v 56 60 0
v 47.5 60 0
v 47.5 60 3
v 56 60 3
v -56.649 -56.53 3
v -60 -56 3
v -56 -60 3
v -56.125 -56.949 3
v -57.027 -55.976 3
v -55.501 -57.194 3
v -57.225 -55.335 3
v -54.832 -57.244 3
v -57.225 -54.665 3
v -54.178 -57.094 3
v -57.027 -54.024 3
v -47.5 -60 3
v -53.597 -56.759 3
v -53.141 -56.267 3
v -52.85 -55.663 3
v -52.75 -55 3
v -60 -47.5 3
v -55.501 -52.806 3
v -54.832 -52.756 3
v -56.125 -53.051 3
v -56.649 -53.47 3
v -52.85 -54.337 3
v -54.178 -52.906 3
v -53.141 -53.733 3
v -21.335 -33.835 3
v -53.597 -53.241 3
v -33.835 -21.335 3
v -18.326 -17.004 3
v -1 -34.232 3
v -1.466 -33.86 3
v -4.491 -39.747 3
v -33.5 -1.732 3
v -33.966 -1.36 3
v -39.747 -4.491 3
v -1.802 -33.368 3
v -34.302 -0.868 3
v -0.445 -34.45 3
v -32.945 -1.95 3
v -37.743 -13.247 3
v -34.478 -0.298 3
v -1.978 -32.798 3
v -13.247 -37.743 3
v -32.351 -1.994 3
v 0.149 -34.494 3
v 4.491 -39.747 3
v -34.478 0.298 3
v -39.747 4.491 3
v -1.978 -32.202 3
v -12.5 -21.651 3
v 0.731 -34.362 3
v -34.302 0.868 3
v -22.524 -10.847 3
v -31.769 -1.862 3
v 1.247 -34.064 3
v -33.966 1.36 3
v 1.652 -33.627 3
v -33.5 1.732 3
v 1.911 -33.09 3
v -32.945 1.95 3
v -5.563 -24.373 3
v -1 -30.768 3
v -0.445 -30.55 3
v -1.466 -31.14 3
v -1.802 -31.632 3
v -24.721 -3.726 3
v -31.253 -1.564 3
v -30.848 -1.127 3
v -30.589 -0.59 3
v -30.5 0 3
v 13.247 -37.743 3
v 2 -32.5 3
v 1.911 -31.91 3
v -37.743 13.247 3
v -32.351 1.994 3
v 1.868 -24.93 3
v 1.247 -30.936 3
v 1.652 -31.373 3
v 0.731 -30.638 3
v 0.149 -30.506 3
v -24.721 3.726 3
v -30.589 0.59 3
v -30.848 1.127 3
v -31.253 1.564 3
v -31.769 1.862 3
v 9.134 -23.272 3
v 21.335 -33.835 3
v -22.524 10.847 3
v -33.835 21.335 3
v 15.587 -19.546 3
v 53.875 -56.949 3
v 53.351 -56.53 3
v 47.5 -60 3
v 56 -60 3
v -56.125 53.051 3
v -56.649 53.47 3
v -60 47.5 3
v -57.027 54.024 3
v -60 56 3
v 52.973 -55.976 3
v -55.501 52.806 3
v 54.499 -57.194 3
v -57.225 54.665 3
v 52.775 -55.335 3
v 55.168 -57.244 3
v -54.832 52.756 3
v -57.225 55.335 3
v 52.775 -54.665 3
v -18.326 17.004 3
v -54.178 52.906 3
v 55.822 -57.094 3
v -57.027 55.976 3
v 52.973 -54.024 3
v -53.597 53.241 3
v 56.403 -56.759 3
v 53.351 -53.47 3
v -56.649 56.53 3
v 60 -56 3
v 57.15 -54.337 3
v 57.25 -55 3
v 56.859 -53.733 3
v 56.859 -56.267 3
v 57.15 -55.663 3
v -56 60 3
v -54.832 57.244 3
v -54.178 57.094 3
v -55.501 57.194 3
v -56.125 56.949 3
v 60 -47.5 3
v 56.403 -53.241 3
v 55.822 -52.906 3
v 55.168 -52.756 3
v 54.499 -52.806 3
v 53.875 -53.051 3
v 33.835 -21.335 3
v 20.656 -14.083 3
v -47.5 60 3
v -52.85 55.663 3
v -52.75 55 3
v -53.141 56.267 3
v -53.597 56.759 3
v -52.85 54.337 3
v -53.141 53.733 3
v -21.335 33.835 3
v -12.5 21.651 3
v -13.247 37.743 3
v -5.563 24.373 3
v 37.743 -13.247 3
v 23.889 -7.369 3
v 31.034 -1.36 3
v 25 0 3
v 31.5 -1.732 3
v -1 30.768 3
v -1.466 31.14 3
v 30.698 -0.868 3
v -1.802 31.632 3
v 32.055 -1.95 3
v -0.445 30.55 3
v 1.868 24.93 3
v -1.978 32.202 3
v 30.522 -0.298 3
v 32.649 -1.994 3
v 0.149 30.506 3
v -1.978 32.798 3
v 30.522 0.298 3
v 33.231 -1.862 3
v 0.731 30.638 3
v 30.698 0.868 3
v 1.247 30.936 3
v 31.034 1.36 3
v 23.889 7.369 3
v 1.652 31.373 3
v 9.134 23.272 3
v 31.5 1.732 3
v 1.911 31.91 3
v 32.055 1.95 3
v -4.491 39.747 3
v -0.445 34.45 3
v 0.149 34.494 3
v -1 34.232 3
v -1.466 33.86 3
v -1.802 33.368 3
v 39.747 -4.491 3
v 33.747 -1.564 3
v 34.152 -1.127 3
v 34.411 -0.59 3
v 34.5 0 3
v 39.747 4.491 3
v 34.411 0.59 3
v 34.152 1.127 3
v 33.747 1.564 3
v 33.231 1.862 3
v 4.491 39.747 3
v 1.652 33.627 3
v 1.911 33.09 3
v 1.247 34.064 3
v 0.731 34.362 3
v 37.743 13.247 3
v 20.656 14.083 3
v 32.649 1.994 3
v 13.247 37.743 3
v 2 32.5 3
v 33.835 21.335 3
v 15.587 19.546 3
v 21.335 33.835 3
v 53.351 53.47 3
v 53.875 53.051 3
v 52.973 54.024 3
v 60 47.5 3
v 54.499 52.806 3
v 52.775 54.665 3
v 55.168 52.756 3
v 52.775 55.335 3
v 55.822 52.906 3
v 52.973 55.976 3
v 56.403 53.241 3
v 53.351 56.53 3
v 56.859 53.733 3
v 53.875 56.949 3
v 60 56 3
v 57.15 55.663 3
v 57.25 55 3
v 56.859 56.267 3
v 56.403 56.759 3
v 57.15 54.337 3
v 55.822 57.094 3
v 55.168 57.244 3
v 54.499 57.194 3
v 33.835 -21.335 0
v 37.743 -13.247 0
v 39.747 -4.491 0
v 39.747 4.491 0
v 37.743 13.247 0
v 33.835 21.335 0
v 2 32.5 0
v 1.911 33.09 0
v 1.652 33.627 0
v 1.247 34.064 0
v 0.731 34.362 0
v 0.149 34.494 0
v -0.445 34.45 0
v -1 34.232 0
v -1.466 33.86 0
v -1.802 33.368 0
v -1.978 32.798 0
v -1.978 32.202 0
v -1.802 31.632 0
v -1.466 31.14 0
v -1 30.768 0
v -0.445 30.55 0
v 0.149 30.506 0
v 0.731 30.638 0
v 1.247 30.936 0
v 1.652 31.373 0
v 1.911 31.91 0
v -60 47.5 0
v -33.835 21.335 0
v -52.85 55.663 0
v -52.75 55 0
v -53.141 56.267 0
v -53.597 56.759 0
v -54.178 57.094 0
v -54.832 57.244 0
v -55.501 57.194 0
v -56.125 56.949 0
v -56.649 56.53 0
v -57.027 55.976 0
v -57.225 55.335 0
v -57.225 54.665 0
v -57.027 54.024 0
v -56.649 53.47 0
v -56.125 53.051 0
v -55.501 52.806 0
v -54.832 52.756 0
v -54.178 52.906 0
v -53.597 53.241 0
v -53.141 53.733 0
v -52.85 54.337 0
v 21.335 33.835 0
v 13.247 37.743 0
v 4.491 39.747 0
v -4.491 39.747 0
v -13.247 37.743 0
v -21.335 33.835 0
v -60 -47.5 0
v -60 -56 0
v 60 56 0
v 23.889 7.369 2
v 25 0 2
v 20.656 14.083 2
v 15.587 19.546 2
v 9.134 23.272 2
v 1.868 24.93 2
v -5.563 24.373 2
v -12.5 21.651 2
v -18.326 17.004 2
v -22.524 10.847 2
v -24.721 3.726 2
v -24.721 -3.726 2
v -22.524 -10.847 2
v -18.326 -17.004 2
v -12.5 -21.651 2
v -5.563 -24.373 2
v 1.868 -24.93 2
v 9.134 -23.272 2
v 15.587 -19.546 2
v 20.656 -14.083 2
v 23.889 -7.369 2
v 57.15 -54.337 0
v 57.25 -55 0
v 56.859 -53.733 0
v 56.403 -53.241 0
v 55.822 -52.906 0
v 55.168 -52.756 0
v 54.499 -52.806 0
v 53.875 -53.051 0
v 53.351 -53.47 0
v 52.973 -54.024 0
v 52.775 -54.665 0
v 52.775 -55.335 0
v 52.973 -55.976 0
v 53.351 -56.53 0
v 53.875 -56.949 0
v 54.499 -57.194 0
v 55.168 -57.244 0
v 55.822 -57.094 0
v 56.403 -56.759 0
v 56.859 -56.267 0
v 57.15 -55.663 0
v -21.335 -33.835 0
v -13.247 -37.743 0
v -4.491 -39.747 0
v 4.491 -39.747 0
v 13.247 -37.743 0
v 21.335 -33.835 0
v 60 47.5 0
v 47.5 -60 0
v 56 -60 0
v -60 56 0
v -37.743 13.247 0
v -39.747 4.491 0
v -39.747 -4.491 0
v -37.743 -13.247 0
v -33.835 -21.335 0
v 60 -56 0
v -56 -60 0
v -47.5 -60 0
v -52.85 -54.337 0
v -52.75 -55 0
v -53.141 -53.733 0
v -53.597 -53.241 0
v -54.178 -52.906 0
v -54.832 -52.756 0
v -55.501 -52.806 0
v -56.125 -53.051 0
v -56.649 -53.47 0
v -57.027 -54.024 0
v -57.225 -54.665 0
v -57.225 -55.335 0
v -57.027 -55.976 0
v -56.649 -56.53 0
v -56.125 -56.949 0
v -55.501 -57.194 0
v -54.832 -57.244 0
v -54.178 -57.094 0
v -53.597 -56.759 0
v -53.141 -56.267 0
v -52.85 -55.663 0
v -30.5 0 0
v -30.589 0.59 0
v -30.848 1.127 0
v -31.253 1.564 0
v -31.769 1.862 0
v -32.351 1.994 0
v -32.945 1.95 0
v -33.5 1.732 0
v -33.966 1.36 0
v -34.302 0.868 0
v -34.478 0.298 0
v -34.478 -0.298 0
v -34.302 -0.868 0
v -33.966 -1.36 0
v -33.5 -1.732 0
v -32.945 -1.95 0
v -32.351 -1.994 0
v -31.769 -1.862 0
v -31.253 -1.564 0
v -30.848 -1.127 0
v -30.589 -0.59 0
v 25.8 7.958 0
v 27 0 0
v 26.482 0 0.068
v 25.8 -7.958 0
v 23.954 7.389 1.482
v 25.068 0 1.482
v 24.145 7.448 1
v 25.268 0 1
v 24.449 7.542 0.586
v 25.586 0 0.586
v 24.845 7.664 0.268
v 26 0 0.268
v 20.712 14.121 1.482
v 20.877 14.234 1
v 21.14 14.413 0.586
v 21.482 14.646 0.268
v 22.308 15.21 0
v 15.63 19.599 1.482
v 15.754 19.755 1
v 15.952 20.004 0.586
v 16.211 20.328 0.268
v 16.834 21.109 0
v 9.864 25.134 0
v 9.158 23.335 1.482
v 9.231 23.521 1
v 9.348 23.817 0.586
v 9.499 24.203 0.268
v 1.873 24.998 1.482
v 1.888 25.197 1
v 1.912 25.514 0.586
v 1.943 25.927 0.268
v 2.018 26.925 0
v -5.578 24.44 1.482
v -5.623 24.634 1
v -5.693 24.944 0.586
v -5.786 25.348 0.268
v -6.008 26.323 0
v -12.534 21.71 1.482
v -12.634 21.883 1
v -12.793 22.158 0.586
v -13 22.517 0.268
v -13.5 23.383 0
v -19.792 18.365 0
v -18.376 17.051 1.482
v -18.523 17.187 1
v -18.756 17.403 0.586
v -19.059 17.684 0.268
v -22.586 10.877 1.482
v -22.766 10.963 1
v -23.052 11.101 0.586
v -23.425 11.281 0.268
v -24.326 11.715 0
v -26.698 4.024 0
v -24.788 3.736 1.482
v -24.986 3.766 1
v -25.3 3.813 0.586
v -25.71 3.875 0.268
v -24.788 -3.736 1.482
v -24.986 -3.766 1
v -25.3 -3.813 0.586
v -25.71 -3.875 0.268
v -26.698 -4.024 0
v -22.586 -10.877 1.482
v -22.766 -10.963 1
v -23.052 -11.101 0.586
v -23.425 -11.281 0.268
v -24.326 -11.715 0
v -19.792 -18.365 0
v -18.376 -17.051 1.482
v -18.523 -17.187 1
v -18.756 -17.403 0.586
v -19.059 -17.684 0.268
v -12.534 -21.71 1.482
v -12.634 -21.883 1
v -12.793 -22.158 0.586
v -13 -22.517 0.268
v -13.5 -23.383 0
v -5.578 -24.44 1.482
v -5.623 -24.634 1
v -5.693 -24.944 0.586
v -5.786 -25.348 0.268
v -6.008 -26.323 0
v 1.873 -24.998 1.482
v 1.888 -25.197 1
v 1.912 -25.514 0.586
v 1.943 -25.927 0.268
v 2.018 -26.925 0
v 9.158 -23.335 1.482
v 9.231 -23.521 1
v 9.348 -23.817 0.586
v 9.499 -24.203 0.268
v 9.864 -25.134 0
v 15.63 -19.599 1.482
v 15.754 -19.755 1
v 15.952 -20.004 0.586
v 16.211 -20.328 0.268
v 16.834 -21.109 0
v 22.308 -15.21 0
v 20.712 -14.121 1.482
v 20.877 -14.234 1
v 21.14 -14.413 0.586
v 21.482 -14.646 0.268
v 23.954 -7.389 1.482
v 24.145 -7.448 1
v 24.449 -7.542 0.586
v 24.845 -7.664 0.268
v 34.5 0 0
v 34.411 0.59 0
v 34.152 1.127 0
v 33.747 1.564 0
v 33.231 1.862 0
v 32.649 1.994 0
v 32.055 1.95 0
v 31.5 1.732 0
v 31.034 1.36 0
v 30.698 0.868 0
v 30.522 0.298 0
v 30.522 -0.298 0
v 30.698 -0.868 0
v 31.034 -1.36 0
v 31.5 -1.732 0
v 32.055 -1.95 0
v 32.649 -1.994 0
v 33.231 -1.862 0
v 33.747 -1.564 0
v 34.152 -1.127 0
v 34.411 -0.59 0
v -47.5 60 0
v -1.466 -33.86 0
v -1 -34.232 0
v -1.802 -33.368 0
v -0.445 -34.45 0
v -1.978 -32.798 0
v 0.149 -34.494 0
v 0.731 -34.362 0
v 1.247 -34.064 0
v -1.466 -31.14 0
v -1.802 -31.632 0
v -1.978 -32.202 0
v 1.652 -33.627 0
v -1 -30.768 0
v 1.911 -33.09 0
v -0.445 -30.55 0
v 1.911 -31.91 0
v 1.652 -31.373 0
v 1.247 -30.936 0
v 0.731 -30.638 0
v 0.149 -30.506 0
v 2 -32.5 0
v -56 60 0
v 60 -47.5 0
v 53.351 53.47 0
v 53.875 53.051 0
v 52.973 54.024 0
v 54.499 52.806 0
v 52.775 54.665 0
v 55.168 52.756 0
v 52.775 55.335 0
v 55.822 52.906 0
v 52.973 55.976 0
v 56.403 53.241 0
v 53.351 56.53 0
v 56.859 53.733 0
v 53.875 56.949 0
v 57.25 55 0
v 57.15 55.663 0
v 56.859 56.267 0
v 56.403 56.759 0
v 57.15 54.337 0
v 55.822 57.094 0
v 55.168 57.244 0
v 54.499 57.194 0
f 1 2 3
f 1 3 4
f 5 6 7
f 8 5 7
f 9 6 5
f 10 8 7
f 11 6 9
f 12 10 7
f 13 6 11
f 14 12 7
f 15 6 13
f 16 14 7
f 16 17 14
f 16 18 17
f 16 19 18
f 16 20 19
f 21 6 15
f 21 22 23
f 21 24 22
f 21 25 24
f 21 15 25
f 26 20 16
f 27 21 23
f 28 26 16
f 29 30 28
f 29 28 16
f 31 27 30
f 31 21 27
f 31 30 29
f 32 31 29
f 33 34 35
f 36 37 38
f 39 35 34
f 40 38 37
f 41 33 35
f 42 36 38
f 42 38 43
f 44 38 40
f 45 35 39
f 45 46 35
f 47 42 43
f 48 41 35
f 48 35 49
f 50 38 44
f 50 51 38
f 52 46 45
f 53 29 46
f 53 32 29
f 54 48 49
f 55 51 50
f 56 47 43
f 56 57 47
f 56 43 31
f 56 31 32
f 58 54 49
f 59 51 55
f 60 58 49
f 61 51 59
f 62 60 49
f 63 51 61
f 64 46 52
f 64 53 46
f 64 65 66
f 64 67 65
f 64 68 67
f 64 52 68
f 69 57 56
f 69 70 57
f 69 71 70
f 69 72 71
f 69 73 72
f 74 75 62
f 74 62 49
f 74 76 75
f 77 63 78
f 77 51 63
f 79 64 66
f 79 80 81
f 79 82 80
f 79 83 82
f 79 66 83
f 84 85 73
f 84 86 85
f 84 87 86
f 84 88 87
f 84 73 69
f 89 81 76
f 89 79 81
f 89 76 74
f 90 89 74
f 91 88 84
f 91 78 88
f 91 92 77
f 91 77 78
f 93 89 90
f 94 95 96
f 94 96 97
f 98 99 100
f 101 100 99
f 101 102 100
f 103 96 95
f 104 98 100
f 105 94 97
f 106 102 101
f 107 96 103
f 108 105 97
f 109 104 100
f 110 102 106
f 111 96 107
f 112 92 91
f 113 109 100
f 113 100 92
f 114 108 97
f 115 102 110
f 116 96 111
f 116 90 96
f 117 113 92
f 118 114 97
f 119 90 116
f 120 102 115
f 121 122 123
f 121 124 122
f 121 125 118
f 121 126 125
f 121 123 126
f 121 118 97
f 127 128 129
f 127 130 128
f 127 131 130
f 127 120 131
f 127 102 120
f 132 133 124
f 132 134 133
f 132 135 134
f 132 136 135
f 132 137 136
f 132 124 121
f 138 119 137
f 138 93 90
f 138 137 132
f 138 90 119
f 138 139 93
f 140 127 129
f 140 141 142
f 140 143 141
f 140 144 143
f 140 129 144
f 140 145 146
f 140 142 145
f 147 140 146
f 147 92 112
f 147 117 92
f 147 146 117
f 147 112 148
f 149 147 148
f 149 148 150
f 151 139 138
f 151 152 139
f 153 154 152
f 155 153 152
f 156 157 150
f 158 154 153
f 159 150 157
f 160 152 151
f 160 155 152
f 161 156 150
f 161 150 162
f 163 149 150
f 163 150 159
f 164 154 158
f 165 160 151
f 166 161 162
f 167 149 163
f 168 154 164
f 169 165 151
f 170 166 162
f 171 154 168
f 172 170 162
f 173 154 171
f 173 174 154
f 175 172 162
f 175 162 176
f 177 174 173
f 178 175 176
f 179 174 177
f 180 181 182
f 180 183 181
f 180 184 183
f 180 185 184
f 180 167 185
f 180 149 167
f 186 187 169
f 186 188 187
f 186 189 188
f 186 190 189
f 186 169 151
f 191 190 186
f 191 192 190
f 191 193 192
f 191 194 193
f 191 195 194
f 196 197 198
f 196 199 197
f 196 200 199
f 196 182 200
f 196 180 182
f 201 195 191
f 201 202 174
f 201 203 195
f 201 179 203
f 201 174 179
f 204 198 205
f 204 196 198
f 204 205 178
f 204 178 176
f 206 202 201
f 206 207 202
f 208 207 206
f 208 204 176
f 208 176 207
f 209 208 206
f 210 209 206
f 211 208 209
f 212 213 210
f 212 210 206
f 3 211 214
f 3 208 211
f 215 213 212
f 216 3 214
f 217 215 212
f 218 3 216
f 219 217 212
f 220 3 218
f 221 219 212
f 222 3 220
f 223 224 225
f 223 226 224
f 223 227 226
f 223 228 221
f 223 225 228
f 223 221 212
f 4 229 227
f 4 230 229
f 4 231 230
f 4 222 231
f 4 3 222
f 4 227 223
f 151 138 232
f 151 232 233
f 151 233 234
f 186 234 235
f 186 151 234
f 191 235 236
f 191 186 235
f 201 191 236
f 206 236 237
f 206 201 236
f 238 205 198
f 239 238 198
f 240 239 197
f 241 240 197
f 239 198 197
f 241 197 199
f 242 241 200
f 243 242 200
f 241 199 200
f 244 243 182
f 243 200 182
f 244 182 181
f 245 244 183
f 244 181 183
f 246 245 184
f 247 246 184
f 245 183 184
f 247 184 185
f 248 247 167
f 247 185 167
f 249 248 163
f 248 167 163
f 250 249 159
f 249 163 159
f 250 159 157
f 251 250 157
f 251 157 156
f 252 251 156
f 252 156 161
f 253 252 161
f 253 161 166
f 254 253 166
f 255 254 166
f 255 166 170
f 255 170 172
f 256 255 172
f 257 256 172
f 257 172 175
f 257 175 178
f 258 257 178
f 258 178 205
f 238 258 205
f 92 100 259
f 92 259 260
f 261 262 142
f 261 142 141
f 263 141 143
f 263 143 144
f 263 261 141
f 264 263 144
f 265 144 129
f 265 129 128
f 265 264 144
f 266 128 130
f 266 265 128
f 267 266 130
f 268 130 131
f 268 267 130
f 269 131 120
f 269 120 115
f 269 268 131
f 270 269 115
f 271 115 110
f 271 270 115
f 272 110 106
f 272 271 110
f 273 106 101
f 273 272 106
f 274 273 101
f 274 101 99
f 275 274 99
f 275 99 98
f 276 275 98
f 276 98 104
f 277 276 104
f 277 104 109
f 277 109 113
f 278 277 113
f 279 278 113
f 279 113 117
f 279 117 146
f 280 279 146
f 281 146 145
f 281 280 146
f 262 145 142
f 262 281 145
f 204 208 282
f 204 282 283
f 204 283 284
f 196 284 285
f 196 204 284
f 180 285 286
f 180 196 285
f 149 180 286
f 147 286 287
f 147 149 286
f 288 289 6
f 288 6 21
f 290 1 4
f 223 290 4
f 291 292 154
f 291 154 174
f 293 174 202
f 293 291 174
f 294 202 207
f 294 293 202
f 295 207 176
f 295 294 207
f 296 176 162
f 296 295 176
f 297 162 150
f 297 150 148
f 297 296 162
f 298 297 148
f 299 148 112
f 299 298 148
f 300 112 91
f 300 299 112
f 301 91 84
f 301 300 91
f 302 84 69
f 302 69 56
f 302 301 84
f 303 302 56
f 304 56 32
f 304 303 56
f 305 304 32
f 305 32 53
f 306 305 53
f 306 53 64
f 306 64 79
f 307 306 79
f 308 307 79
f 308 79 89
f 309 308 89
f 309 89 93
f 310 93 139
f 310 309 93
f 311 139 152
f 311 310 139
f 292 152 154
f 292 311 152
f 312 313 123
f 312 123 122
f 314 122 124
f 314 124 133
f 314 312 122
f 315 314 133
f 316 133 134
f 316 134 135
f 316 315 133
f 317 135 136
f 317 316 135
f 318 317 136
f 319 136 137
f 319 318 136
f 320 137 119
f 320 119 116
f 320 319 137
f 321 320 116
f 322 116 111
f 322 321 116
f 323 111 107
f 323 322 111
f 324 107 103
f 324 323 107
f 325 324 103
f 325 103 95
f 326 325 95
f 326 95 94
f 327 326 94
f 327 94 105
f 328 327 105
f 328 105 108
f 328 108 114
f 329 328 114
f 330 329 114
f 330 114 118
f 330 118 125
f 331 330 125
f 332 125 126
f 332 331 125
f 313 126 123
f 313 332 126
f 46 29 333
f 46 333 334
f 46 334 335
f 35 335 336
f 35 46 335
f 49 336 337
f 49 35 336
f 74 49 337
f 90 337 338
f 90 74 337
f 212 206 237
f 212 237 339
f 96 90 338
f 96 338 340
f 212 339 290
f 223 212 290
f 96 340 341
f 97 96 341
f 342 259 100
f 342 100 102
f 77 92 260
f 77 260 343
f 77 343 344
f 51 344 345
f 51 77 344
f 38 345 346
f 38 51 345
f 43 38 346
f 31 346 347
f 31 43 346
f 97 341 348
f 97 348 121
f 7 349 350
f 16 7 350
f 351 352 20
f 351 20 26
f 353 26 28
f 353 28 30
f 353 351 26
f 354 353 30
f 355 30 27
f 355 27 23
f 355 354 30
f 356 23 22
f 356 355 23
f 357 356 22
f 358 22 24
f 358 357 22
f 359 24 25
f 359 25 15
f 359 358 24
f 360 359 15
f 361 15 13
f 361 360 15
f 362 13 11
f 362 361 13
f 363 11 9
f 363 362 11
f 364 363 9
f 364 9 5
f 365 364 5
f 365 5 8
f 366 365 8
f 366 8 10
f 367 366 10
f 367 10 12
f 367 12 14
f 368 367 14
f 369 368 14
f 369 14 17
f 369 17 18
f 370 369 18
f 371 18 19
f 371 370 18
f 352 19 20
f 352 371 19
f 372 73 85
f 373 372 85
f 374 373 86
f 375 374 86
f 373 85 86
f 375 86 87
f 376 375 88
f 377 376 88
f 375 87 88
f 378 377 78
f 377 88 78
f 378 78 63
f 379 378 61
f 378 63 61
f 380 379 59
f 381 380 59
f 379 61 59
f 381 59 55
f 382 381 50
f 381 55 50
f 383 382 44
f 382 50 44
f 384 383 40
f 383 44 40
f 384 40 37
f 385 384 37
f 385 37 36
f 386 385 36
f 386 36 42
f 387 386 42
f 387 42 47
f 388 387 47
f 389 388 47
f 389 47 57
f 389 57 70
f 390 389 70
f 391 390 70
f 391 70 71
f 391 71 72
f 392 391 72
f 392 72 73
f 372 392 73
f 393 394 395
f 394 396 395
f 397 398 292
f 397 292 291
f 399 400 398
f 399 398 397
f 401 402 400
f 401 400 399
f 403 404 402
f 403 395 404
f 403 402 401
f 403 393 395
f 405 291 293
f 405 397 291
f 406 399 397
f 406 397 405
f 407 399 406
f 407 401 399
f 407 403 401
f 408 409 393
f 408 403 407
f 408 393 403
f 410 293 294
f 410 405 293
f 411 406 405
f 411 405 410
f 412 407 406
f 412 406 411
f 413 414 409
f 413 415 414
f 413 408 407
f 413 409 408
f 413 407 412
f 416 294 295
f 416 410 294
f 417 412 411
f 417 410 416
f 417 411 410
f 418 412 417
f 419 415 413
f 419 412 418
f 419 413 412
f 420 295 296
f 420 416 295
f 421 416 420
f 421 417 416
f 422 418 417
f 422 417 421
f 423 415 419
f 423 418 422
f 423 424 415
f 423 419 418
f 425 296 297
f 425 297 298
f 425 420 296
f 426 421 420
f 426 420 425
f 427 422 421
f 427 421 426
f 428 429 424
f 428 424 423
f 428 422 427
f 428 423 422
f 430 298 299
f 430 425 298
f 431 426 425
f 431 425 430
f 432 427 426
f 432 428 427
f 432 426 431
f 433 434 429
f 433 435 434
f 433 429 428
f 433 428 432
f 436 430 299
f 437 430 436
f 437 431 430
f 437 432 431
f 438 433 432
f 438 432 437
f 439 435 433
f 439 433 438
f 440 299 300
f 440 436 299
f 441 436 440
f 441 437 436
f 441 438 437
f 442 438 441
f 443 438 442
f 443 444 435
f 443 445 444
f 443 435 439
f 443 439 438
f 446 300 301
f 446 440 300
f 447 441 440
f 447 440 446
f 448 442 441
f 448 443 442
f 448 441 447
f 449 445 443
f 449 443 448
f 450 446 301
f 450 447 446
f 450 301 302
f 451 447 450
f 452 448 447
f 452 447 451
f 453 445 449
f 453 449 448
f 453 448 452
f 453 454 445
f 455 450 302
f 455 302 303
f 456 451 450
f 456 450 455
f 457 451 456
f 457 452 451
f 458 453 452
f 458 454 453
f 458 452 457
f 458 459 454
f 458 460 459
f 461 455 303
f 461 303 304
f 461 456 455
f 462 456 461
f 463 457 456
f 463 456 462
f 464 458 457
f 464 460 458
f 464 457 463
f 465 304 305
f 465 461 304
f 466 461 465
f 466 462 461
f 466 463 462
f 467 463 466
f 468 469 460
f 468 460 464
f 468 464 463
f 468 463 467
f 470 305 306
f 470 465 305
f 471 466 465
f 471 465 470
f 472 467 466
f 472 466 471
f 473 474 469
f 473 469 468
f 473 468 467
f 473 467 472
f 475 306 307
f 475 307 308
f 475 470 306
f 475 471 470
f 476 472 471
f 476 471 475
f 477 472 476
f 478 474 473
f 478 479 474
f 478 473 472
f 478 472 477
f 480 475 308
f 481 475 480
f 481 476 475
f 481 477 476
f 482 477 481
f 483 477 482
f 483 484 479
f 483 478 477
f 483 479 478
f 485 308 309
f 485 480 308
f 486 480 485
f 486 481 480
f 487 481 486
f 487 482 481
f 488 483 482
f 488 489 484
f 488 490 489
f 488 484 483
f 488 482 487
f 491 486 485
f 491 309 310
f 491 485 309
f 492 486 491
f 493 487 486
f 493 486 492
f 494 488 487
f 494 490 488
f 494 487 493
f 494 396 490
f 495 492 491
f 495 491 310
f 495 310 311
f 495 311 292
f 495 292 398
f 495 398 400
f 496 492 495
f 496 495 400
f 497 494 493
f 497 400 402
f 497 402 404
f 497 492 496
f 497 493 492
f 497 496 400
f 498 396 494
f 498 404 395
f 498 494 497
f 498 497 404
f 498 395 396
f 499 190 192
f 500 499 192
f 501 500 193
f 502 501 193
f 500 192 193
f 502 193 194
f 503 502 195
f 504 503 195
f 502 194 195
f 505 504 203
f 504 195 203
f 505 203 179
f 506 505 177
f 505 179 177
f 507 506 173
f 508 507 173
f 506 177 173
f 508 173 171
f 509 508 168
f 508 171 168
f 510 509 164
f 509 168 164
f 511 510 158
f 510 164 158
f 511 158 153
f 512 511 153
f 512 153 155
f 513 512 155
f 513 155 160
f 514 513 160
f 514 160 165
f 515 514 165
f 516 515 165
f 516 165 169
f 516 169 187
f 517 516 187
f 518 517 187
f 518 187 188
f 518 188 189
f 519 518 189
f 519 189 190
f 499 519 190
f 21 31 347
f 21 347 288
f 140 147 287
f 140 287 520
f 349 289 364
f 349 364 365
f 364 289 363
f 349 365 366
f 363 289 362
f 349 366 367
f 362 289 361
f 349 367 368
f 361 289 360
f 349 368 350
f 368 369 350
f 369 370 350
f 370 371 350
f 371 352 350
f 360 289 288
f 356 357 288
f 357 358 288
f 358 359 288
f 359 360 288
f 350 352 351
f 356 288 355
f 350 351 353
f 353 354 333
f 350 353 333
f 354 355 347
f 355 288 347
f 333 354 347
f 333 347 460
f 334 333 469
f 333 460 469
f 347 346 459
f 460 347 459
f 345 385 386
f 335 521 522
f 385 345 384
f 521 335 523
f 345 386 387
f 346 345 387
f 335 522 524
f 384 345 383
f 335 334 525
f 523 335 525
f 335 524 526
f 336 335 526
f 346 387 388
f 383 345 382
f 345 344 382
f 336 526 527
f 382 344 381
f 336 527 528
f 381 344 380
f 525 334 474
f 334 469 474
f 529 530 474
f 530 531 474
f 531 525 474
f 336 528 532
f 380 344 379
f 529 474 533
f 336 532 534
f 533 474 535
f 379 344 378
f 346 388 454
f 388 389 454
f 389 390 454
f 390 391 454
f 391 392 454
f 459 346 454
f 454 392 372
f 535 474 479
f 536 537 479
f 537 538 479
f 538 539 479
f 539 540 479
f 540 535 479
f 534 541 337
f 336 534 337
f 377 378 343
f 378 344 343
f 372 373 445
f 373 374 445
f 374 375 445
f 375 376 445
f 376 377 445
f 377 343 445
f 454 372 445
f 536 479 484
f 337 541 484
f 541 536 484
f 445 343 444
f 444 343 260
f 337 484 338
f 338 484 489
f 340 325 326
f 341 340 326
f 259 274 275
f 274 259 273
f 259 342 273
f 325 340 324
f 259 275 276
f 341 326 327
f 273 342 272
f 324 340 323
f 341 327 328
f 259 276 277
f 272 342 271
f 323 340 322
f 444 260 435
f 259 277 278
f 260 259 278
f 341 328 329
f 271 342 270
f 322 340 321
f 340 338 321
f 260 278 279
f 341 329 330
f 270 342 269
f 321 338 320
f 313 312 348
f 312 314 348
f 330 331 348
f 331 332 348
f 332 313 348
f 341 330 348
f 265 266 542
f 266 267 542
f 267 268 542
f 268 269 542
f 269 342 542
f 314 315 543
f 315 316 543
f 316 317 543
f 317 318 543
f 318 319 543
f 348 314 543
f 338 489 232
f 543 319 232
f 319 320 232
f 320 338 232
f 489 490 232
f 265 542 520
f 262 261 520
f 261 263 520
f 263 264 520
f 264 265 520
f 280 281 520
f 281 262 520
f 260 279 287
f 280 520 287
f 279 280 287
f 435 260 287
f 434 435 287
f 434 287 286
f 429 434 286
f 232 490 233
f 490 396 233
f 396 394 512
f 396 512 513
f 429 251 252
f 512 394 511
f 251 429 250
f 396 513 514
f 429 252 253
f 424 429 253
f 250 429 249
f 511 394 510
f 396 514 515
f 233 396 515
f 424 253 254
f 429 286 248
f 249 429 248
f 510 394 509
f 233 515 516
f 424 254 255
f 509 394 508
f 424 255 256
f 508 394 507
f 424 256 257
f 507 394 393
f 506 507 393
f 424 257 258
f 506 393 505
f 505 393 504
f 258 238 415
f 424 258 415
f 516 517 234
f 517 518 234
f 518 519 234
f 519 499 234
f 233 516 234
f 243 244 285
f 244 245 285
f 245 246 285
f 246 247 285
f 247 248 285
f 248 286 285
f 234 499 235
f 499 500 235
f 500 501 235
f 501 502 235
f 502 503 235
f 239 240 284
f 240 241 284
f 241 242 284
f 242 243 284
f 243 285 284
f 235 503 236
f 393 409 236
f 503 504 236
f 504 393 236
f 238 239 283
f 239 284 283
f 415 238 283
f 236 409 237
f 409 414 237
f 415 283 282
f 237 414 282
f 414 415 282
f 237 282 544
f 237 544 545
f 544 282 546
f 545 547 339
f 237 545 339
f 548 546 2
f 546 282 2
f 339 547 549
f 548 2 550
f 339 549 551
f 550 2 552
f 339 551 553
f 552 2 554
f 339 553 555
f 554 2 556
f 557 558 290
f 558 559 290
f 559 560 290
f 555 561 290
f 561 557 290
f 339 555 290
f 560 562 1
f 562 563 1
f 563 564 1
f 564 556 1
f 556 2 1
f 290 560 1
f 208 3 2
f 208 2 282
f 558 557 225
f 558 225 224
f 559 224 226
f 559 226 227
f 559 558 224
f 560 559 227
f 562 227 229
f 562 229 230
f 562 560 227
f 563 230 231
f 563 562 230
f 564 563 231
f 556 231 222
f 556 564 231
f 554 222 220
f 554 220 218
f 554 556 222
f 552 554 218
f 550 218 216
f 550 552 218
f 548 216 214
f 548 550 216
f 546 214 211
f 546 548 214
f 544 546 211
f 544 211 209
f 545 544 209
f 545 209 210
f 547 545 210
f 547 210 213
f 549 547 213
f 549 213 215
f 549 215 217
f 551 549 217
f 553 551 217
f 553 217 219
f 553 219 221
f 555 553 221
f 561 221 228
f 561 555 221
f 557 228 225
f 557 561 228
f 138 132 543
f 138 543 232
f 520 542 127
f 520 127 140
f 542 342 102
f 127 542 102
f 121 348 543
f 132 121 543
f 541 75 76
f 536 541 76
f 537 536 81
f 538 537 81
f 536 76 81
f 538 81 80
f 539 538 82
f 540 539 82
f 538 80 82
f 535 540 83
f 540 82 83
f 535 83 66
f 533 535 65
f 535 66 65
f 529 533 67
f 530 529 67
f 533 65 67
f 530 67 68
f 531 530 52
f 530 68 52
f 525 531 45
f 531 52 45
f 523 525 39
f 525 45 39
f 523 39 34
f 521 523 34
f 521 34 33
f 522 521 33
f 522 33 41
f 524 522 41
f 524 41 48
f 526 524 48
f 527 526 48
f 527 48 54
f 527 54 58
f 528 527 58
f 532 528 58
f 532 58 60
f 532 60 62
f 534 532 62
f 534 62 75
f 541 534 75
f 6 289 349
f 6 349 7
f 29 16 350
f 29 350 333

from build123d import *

# Parameters (mm, degrees)
SKETCH_W     = 120
SKETCH_H     = 120
SKETCH_R     = 2.25
SKETCH_R_2   = 25
PAD_DEPTH    = 3
FILLET_R     = 2
CHAMFER_SIZE = 4
SKETCH001_R  = 2
POCKET_DEPTH = 3.001


with BuildPart() as part:
    # Sketch → Pad (new body)
    with BuildSketch(Plane.XY):
        Rectangle(SKETCH_W, SKETCH_H)
        with Locations((-55, 55)):
            Circle(SKETCH_R, mode=Mode.SUBTRACT)
        with Locations((55, 55)):
            Circle(SKETCH_R, mode=Mode.SUBTRACT)
        with Locations((55, -55)):
            Circle(SKETCH_R, mode=Mode.SUBTRACT)
        with Locations((-55, -55)):
            Circle(SKETCH_R, mode=Mode.SUBTRACT)
        Circle(SKETCH_R_2, mode=Mode.SUBTRACT)
    extrude(amount=PAD_DEPTH)

    # Fillet
    fillet_edges = [part.edges().sort_by_distance(p)[0] for p in [
        (-25, 0, 0),
    ]]
    fillet(fillet_edges, radius=FILLET_R)

    # Chamfer
    chamfer_edges = [part.edges().sort_by_distance(p)[0] for p in [
        (-60, -60, 1.5),
        (60, -60, 1.5),
        (60, 60, 1.5),
        (-60, 60, 1.5),
    ]]
    chamfer(chamfer_edges, length=CHAMFER_SIZE)

    # Sketch001 (on Face1 of Chamfer) → Pocket (cut, through all)
    with BuildSketch(Plane.XY.offset(3)):
        with Locations((0, 32.5)):
            Circle(SKETCH001_R)
        with Locations((32.5, 0)):
            Circle(SKETCH001_R)
        with Locations((0, -32.5)):
            Circle(SKETCH001_R)
        with Locations((-32.5, 0)):
            Circle(SKETCH001_R)
        with BuildLine():
            Line((-60, 47.5), (-33.835096, 21.335096))
            ThreePointArc((-33.835096, 21.335096), (-40, 0), (-33.835096, -21.335096))
            Line((-33.835096, -21.335096), (-60, -47.5))
            Line((-60, 47.5), (-60, -47.5))
        make_face()
        with BuildLine():
            Line((-47.5, -60), (-21.335096, -33.835096))
            ThreePointArc((-21.335096, -33.835096), (0, -40), (21.335096, -33.835096))
            Line((21.335096, -33.835096), (47.5, -60))
            Line((-47.5, -60), (47.5, -60))
        make_face()
        with BuildLine():
            Line((60, -47.5), (33.835096, -21.335096))
            ThreePointArc((33.835096, -21.335096), (40, 0), (33.835096, 21.335096))
            Line((33.835096, 21.335096), (60, 47.5))
            Line((60, -47.5), (60, 47.5))
        make_face()
        with BuildLine():
            Line((47.5, 60), (21.335096, 33.835096))
            ThreePointArc((21.335096, 33.835096), (0, 40), (-21.335096, 33.835096))
            Line((-21.335096, 33.835096), (-47.5, 60))
            Line((47.5, 60), (-47.5, 60))
        make_face()
    extrude(amount=-POCKET_DEPTH, mode=Mode.SUBTRACT)


solid = part.part
